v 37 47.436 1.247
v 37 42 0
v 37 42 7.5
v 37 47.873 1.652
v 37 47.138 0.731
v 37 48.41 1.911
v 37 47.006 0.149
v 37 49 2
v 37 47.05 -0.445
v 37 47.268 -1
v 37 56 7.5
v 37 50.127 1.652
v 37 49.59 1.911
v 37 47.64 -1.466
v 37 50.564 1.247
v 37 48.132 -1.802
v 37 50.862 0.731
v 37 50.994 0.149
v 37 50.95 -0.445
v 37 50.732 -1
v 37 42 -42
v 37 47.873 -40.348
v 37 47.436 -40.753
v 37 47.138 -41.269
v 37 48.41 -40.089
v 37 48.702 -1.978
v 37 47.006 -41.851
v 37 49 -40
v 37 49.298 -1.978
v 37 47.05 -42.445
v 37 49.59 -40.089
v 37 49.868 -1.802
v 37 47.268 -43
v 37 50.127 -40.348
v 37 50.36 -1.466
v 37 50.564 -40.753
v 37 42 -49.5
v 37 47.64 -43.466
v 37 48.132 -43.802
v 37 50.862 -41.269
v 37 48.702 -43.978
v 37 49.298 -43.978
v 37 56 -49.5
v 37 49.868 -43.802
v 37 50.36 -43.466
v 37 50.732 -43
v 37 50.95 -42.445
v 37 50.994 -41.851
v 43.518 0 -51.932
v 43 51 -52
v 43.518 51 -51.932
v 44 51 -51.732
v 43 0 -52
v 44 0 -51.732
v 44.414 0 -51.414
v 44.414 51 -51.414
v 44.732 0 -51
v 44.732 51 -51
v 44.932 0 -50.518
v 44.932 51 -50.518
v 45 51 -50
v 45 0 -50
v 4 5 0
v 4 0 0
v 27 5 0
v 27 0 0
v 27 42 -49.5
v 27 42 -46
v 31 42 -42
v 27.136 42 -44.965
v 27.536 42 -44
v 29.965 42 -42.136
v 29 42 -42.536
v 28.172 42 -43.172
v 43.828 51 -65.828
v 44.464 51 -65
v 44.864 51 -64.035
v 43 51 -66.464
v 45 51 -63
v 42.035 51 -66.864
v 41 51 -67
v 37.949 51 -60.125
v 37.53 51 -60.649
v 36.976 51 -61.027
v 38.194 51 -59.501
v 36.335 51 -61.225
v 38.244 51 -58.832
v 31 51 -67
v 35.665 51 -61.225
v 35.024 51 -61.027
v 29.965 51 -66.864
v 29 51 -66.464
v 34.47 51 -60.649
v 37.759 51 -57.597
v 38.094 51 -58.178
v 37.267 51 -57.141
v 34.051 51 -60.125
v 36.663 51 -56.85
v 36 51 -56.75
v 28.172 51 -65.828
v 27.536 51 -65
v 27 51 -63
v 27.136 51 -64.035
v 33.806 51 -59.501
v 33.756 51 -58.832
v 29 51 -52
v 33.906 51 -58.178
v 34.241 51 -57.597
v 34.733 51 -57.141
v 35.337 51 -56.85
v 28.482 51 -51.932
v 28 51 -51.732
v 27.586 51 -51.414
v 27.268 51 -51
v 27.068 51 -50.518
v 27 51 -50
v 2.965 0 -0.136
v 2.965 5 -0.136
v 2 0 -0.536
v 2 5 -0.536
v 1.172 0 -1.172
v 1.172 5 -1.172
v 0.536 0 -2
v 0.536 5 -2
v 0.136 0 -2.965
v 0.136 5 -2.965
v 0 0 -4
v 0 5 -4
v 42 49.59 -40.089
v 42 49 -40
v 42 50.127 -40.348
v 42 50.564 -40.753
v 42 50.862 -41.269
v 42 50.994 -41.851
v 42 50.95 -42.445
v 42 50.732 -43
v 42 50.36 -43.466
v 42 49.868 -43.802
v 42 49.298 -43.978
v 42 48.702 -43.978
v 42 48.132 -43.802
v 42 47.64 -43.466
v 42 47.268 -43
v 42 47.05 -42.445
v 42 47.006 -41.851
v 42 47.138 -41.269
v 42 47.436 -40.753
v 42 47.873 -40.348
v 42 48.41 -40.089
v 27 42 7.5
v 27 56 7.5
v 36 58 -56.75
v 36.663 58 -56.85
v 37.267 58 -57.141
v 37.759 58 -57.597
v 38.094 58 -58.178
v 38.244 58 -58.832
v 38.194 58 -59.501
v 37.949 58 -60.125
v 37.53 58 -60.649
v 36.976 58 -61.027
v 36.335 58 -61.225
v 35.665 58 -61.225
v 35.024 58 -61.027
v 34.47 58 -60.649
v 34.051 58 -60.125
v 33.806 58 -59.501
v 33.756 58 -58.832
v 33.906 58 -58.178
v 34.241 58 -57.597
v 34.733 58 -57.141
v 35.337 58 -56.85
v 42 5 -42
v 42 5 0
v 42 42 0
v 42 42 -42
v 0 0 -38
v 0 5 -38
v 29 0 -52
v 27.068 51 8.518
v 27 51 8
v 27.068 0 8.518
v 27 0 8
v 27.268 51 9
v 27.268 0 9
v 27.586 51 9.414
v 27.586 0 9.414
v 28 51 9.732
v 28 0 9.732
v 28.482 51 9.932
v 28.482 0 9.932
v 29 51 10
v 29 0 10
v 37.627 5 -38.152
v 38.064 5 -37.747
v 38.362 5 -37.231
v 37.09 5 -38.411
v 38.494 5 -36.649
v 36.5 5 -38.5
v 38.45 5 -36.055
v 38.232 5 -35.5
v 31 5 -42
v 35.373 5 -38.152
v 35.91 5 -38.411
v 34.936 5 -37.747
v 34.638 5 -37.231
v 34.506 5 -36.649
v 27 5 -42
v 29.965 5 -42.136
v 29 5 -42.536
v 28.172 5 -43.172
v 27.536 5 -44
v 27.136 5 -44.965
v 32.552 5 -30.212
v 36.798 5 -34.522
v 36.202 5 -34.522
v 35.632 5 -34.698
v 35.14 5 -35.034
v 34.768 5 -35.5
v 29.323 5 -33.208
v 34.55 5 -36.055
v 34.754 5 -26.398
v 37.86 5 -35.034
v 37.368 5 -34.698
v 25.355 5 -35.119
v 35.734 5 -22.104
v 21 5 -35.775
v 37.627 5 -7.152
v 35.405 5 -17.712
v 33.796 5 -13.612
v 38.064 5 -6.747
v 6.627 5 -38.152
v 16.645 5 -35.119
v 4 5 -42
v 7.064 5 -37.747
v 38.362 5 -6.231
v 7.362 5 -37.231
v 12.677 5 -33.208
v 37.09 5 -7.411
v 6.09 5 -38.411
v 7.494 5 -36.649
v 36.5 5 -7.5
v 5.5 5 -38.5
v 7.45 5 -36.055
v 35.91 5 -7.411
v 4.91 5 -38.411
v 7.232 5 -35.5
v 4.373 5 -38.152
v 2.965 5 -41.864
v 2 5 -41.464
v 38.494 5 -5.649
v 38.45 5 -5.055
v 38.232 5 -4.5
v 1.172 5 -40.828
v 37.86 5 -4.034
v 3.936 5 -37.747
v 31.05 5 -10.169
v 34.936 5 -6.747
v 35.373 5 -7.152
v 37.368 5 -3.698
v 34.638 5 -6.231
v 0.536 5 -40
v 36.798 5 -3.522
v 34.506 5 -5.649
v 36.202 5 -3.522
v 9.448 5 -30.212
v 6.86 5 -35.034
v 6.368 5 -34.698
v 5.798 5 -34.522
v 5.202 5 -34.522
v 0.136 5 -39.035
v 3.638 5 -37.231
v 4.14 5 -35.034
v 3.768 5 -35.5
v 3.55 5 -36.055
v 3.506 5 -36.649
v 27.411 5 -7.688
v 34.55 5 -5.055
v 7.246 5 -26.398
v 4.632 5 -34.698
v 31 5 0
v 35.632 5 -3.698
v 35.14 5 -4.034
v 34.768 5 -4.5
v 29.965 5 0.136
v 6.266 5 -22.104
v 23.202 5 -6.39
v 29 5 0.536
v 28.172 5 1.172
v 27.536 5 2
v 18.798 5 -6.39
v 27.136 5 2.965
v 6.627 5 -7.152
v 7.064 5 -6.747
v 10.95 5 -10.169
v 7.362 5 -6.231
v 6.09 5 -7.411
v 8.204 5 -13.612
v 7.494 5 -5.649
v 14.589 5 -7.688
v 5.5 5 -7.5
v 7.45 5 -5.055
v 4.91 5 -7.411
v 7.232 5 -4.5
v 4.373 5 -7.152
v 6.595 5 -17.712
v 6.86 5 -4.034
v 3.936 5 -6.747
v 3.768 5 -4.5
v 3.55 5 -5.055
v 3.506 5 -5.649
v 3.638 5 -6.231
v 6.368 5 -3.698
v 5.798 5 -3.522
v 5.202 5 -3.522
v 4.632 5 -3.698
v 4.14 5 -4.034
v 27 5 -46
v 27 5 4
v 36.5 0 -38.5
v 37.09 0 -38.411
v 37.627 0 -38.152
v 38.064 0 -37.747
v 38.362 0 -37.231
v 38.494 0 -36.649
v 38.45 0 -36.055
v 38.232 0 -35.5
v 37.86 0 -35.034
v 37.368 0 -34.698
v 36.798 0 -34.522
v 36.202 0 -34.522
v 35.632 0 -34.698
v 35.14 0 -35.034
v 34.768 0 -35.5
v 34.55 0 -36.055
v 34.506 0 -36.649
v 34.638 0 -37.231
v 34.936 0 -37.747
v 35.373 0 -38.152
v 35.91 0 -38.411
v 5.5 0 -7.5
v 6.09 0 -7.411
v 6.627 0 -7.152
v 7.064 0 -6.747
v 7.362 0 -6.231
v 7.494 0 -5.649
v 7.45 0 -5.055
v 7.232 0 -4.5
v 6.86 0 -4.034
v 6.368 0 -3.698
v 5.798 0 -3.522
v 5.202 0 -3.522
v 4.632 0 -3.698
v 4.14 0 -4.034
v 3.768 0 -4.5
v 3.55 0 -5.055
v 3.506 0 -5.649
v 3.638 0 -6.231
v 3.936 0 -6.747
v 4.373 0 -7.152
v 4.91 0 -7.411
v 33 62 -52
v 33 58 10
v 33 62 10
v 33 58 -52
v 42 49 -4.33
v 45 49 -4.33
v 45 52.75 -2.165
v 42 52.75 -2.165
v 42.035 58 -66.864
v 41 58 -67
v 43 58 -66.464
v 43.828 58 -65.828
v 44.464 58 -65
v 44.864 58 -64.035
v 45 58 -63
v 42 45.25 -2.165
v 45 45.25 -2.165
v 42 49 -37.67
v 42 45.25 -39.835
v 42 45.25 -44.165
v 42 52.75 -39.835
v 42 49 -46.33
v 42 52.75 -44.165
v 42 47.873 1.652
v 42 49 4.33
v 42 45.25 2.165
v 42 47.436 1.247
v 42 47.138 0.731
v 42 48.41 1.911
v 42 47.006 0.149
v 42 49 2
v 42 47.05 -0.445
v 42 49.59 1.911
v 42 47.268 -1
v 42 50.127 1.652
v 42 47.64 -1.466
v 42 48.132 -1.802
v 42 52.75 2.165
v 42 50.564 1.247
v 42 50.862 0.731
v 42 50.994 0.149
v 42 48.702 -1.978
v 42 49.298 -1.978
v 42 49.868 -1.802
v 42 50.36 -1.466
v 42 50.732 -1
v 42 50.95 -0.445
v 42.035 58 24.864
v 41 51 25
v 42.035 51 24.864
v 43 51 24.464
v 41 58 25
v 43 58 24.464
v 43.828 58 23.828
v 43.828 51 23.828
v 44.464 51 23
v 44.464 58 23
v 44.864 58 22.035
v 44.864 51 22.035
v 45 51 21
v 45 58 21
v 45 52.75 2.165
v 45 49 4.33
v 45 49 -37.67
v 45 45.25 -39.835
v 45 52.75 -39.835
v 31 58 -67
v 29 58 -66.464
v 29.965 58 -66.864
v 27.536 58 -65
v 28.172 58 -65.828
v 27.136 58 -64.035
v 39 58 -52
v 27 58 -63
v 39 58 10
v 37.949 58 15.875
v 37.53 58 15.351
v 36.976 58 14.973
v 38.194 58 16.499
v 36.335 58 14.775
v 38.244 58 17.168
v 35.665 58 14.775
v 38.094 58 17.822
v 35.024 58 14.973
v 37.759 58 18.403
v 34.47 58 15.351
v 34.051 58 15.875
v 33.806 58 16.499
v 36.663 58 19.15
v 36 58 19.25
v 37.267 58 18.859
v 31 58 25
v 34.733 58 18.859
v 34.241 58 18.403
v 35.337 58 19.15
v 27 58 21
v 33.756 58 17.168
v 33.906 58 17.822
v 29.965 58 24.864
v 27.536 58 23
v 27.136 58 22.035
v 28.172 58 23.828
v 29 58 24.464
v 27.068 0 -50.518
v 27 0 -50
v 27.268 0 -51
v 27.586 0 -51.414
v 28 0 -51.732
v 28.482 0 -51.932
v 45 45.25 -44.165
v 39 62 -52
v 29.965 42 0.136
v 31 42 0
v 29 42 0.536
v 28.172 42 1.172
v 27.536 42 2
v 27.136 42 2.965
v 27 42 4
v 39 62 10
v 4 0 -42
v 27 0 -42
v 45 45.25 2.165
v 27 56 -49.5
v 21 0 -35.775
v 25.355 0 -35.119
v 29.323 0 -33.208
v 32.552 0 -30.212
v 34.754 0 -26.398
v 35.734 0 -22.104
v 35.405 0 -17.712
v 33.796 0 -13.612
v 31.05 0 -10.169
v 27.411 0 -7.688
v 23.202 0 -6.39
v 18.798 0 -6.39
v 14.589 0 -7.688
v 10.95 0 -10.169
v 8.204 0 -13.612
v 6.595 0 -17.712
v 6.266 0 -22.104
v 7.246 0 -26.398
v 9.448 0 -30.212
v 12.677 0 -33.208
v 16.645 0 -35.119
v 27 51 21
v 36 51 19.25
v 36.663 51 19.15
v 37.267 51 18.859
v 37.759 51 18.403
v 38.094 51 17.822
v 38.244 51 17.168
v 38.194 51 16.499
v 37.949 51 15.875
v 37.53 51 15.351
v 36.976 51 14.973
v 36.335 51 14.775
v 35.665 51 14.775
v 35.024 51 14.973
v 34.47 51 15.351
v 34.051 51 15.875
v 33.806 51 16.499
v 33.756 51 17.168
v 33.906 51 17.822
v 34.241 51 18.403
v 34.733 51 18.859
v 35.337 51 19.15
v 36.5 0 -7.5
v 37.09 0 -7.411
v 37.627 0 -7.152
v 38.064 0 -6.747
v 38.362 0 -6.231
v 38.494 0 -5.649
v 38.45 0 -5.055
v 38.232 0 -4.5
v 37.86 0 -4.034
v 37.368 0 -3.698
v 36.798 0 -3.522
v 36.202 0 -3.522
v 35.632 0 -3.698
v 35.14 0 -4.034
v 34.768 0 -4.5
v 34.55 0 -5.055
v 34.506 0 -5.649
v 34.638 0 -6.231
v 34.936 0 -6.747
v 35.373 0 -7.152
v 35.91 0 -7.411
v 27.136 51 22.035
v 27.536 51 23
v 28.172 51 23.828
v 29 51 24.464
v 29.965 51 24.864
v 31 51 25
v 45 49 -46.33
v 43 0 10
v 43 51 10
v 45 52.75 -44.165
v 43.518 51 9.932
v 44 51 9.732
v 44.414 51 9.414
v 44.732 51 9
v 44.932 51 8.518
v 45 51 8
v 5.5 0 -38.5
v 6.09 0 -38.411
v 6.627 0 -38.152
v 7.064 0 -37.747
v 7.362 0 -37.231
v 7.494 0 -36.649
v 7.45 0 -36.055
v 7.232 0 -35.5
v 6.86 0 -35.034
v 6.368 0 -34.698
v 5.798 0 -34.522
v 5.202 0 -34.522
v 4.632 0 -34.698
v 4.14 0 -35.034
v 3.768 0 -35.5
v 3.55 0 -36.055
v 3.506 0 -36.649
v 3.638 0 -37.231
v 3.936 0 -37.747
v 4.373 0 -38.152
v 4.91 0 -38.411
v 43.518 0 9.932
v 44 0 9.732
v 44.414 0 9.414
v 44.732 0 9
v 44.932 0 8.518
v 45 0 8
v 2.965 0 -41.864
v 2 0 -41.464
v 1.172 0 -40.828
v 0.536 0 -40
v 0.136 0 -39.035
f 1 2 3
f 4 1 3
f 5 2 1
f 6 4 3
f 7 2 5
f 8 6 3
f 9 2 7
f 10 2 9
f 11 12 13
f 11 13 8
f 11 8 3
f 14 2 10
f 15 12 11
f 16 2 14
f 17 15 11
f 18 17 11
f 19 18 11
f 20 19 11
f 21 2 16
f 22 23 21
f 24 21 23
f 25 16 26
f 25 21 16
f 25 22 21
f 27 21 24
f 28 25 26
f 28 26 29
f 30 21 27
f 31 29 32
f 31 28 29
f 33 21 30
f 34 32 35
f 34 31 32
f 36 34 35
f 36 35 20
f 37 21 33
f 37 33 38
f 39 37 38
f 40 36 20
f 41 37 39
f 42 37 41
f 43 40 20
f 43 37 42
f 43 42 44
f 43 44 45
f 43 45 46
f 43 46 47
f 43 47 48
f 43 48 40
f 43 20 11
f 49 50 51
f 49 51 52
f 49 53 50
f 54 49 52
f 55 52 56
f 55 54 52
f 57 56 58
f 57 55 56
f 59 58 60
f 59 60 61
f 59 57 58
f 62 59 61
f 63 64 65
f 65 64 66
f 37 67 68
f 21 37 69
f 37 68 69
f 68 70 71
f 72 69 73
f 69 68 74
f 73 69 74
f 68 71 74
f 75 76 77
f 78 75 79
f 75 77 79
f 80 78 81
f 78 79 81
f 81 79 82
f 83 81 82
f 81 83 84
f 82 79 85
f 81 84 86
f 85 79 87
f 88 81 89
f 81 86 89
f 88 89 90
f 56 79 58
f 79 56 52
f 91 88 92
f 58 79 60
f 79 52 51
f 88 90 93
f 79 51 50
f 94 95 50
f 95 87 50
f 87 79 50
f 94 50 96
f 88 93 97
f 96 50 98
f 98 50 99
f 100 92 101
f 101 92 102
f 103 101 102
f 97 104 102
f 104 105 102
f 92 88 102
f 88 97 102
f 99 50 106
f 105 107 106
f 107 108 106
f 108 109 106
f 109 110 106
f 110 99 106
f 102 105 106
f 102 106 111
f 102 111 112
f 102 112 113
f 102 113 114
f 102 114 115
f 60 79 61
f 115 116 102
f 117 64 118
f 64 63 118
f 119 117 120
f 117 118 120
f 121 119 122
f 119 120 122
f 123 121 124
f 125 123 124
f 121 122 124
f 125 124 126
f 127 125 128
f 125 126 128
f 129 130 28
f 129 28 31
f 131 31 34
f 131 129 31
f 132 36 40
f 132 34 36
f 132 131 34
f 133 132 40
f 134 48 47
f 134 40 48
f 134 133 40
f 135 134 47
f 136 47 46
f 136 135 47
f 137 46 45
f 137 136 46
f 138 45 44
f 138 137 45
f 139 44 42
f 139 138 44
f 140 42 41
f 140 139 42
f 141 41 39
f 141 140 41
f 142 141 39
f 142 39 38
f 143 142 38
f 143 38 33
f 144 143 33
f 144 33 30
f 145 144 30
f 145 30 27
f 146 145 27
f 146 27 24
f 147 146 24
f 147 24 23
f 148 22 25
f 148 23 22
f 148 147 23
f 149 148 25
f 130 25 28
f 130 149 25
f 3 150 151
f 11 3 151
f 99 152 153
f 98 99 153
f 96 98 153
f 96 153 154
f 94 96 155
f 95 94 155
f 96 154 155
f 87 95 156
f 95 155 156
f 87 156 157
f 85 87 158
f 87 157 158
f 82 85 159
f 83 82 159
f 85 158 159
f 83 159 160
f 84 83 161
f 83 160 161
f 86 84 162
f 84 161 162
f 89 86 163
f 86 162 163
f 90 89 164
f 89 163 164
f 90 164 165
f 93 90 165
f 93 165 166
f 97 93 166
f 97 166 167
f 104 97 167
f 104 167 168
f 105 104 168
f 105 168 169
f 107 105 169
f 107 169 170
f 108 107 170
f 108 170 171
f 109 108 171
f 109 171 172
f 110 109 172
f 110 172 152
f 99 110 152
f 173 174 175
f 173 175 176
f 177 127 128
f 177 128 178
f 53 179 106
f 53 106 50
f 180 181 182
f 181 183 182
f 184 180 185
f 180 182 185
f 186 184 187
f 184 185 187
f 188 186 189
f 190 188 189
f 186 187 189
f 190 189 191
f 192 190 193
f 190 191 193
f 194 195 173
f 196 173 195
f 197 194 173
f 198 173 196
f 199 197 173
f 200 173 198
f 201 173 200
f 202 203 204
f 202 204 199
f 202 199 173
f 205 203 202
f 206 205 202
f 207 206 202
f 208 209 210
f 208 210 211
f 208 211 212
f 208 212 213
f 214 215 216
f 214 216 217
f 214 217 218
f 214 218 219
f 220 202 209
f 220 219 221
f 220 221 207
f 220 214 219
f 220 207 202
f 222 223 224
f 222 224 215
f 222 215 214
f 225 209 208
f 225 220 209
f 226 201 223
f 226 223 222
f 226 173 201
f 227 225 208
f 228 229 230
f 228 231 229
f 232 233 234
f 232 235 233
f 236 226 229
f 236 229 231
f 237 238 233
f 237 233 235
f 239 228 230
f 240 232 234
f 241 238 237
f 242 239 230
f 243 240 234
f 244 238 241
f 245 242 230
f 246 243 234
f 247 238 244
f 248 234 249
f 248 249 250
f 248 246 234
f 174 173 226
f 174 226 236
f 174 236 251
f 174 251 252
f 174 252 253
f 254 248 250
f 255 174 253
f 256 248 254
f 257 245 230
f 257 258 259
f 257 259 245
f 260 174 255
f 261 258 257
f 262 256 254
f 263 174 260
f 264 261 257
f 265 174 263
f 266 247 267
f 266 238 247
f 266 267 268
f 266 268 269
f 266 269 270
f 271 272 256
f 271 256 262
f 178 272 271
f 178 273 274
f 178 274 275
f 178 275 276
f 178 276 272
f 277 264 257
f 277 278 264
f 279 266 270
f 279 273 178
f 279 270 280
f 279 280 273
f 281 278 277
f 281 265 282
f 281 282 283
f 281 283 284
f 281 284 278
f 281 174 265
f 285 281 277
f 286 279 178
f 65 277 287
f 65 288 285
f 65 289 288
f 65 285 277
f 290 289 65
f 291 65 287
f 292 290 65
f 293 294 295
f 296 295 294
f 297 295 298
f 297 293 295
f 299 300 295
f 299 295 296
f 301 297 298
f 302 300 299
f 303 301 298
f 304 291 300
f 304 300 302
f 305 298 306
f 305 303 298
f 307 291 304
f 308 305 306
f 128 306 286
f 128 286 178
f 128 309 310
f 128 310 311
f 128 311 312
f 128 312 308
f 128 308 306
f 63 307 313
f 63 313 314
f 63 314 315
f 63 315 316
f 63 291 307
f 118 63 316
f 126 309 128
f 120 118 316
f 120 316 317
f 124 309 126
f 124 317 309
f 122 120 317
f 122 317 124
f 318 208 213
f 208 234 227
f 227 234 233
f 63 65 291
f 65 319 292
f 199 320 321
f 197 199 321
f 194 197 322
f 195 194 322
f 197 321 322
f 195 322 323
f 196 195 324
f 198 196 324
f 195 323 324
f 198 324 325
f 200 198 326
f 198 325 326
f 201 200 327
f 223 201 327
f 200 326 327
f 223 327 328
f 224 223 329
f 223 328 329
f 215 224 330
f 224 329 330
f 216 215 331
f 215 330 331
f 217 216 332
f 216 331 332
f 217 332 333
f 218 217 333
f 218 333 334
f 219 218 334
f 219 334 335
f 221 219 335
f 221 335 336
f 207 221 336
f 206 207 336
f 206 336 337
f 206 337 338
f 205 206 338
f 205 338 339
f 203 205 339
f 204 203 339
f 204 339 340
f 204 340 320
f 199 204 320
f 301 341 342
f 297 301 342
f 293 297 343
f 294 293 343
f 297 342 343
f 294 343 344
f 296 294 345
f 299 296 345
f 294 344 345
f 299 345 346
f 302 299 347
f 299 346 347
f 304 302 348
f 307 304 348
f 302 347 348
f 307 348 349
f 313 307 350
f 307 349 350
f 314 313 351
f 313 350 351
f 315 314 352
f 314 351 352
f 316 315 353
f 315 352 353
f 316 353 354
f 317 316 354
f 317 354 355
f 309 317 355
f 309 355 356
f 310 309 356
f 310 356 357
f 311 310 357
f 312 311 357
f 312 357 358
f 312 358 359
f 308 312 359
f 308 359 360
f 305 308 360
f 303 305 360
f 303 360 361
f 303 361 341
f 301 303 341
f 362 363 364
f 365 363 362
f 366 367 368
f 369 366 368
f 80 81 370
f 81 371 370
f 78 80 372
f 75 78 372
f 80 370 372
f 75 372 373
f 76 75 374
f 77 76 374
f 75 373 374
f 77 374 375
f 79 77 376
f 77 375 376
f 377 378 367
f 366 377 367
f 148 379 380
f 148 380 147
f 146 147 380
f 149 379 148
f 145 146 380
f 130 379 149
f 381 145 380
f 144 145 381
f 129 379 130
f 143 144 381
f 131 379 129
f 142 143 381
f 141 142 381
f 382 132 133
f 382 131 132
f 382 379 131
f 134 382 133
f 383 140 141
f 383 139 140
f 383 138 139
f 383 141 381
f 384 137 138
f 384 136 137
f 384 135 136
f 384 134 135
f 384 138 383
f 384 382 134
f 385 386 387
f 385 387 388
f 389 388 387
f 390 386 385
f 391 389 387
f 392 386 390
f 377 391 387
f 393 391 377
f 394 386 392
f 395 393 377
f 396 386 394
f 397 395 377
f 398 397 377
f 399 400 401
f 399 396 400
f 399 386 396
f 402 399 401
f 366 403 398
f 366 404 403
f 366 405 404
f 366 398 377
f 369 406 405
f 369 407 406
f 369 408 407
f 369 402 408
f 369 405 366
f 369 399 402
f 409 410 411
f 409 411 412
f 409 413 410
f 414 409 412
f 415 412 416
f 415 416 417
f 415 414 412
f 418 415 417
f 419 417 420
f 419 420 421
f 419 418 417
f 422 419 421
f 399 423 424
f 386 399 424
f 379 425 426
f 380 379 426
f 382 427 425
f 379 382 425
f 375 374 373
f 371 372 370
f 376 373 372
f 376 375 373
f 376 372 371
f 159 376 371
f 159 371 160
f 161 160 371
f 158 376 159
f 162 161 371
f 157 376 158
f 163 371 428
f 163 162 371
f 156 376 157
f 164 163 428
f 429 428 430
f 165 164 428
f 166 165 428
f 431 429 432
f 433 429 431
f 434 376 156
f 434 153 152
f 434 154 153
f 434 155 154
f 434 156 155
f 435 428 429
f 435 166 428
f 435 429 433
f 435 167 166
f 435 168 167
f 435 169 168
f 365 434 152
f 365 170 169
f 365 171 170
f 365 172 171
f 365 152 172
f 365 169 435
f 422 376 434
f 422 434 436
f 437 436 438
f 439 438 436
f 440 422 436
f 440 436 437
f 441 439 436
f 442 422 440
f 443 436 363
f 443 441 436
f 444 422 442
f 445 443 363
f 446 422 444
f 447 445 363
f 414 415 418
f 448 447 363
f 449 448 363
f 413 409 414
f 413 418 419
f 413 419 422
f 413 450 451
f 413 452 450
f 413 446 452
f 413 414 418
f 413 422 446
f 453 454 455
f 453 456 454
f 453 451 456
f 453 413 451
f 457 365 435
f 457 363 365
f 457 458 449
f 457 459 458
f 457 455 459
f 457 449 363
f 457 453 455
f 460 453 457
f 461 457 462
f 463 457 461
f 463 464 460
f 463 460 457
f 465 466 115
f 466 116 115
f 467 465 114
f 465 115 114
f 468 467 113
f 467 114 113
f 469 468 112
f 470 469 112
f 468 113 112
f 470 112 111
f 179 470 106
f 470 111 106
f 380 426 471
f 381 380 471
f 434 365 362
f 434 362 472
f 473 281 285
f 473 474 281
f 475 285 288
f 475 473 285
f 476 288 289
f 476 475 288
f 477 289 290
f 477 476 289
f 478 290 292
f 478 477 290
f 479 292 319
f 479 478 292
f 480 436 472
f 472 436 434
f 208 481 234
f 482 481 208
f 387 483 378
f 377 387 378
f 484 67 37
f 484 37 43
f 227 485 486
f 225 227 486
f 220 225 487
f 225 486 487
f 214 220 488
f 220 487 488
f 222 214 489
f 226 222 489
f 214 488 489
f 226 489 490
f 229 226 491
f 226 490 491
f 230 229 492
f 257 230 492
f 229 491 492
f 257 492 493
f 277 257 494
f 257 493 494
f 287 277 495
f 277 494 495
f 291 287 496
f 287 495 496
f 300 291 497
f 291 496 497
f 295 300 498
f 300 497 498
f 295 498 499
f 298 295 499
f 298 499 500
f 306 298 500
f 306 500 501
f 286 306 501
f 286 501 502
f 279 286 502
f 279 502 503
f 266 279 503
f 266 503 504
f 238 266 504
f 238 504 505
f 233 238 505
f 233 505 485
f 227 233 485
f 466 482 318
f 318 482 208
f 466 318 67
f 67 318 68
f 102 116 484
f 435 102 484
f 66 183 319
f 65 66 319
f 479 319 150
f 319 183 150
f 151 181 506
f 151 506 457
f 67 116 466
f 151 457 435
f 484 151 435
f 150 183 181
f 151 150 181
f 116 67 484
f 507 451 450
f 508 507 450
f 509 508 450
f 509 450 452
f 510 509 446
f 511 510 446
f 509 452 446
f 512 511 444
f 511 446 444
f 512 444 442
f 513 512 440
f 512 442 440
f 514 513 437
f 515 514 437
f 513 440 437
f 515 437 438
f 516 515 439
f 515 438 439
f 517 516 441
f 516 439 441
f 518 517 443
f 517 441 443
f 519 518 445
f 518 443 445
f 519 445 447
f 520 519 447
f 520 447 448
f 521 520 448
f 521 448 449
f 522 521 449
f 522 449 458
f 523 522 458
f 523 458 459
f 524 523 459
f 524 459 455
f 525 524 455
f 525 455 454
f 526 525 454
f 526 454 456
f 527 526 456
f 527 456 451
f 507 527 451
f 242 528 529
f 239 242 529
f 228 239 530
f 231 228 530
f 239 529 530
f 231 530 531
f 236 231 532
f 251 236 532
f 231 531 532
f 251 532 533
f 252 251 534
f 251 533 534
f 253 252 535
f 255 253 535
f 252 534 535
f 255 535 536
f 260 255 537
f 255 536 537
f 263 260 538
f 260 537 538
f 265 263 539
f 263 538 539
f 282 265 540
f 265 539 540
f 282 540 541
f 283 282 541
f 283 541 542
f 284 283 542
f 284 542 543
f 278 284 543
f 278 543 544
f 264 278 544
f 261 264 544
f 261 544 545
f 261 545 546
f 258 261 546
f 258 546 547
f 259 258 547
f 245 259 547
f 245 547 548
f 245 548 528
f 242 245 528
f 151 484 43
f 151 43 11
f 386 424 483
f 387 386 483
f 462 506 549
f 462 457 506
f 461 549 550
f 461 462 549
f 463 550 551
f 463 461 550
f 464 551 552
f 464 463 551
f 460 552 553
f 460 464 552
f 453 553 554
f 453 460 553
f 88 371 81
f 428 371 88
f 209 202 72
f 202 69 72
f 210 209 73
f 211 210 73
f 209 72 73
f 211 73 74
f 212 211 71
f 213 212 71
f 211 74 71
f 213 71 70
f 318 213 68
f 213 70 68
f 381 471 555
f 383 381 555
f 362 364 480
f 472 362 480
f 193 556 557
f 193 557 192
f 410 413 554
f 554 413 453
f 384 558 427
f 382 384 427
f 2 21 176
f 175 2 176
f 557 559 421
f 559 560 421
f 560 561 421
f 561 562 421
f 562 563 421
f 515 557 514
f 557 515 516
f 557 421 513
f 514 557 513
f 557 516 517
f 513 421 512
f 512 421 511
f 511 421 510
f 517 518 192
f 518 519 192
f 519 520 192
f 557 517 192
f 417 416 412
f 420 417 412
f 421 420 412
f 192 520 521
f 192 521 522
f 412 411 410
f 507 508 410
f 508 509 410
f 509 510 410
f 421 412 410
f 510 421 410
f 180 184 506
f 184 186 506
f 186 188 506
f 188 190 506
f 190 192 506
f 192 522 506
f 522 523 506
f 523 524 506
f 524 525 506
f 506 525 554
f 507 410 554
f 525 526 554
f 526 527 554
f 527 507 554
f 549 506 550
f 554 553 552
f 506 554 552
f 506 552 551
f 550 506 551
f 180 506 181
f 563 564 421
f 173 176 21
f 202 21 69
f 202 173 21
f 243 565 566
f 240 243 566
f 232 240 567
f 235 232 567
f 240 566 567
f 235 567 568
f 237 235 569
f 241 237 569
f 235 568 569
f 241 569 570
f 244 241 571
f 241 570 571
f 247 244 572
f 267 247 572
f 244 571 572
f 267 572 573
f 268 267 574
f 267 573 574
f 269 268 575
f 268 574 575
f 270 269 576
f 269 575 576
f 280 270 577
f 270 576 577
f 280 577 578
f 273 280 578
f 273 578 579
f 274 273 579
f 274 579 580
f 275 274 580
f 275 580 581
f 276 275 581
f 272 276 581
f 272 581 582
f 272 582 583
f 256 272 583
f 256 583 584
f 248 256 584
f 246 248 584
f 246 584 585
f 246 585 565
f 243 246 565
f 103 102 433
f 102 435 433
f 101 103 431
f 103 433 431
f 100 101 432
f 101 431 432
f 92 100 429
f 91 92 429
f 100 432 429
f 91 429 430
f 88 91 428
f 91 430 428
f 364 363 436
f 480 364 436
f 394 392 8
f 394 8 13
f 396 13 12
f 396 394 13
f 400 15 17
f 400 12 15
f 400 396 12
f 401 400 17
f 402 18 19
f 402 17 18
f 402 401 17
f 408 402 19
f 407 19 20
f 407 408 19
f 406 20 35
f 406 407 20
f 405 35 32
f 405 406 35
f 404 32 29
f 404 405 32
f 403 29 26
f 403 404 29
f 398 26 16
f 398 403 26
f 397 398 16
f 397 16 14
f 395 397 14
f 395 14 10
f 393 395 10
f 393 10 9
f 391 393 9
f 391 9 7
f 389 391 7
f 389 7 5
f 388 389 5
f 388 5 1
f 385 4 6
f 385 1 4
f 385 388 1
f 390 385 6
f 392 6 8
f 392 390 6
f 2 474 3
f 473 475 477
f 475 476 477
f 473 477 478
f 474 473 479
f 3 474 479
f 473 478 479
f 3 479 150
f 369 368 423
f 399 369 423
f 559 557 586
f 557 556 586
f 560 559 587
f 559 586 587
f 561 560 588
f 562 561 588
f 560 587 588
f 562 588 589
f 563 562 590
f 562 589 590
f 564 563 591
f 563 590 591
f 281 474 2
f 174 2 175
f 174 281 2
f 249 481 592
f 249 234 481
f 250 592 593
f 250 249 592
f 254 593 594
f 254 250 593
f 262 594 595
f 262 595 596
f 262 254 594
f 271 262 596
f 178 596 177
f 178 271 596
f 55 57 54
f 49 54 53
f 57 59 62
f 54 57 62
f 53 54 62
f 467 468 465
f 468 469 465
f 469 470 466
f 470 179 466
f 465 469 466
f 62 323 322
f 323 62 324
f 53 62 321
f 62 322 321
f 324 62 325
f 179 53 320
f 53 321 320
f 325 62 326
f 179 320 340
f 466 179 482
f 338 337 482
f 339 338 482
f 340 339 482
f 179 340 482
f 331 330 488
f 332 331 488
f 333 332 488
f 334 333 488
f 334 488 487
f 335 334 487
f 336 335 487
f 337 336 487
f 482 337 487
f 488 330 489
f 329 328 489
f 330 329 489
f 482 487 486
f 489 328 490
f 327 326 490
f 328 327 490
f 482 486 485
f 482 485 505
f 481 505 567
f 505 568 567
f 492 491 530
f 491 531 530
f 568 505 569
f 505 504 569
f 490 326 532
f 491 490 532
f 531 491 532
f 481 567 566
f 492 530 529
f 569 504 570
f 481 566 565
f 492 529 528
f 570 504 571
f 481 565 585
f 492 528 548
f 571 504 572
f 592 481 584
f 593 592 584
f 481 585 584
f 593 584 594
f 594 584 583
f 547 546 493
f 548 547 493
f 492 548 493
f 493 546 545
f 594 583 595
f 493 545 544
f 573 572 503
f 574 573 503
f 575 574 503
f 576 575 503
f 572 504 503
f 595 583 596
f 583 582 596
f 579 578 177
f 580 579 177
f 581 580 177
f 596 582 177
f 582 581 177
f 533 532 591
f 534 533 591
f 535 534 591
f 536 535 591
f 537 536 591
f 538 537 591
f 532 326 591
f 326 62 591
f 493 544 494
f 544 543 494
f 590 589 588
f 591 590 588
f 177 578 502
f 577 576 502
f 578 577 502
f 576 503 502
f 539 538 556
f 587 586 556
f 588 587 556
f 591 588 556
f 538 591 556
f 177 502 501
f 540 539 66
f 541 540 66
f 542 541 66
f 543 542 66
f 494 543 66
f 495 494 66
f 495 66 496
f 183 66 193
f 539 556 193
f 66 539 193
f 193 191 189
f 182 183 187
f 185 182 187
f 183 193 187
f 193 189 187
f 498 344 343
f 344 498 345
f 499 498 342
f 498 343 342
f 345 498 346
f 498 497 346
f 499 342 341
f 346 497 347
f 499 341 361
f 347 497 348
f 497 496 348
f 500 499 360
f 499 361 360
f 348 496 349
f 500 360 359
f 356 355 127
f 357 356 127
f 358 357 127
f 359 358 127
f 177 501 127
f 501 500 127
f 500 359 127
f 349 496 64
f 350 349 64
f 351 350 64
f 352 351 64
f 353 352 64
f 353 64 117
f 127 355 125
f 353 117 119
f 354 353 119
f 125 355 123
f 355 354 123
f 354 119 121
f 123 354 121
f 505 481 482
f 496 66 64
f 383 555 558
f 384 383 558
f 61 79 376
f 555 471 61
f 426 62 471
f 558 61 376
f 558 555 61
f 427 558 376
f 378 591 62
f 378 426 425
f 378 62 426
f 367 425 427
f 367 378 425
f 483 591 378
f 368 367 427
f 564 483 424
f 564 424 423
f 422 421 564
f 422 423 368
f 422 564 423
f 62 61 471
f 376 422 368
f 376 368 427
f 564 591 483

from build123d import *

# Parameters (mm, degrees)
SKETCH_1_W           = 45
SKETCH_1_H           = 42
EXTRUDE_1_DEPTH      = 5
SKETCH_3_R           = 14.775
SKETCH_3_R_2         = 2
CUT_EXTRUDE_1_DEPTH  = 13
SKETCH_7_W           = 18
SKETCH_7_H           = 5
EXTRUDE_3_DEPTH      = 10
SKETCH_8_W           = 18
SKETCH_8_H           = 5
EXTRUDE_4_DEPTH      = 10
EXTRUDE_5_DEPTH      = 53
EXTRUDE_6_DEPTH      = 15
EXTRUDE_6_DEPTH_BACK = 77
SKETCH_11_W          = 18
SKETCH_11_H          = 7
SKETCH_12_W          = 57
SKETCH_12_H          = 14
CUT_EXTRUDE_2_DEPTH  = 10
SKETCH_15_R          = 2.25
CUT_EXTRUDE_5_DEPTH  = 10
SKETCH_16_W          = 6
SKETCH_16_H          = 62
EXTRUDE_7_DEPTH      = 4
SKETCH_17_W          = 5
SKETCH_17_H          = 9.7027375
EXTRUDE_8_DEPTH      = 42
SKETCH_13_R          = 2
CUT_EXTRUDE_3_DEPTH  = 16
CUT_EXTRUDE_4_DEPTH  = 3
FILLET_1_R           = 4
FILLET_2_R           = 2


with BuildPart() as part:
    # Эскиз1 → Бобышка-Вытянуть1 (new body)
    with BuildSketch(Plane(origin=(0, 0, 0), x_dir=(1, 0, 0), z_dir=(0, 1, 0))):
        with Locations((22.5, 21)):
            Rectangle(SKETCH_1_W, SKETCH_1_H)
    extrude(amount=EXTRUDE_1_DEPTH)

    # Эскиз3 → Вырез-Вытянуть1 (cut)
    with BuildSketch(Plane.XZ):
        with Locations(Location((21, -21, 0), (0, 0, 270))):
            Circle(SKETCH_3_R)
        with Locations(Location((36.5, -5.5, 0), (0, 0, 270))):
            Circle(SKETCH_3_R_2)
        with Locations(Location((5.5, -5.5, 0), (0, 0, 270))):
            Circle(SKETCH_3_R_2)
        with Locations(Location((5.5, -36.5, 0), (0, 0, 270))):
            Circle(SKETCH_3_R_2)
        with Locations(Location((36.5, -36.5, 0), (0, 0, 270))):
            Circle(SKETCH_3_R_2)
    extrude(amount=-CUT_EXTRUDE_1_DEPTH, mode=Mode.SUBTRACT)

    # Эскиз7 → Бобышка-Вытянуть3 (add)
    with BuildSketch(Plane.XY):
        with Locations((36, 2.5)):
            Rectangle(SKETCH_7_W, SKETCH_7_H)
    extrude(amount=EXTRUDE_3_DEPTH)

    # Эскиз8 → Бобышка-Вытянуть4 (add)
    with BuildSketch(Plane(origin=(0, 0, -42), x_dir=(-1, 0, 0), z_dir=(0, 0, -1))):
        with Locations((-36, 2.5)):
            Rectangle(SKETCH_8_W, SKETCH_8_H)
    extrude(amount=EXTRUDE_4_DEPTH)

    # Эскиз10 → Бобышка-Вытянуть5 (add)
    with BuildSketch(Plane(origin=(0, 5, 0), x_dir=(1, 0, 0), z_dir=(0, 1, 0))):
        Polygon((27, 52), (45, 52), (45, -10), (27, -10), (27, 0), (42, 0), (42, 42), (27, 42), align=None)
    extrude(amount=EXTRUDE_5_DEPTH)

    # Эскиз11 → Бобышка-Вытянуть6 (add, two sides: drawn at the far end of the back side and taken through both)
    with BuildSketch(Plane(origin=(0, 0, -52), x_dir=(-1, 0, 0), z_dir=(0, 0, -1)).offset(-EXTRUDE_6_DEPTH_BACK)):
        with Locations((-36, 54.5)):
            Rectangle(SKETCH_11_W, SKETCH_11_H)
    extrude(amount=EXTRUDE_6_DEPTH + EXTRUDE_6_DEPTH_BACK)

    # Эскиз12 → Вырез-Вытянуть2 (cut)
    with BuildSketch(Plane.ZY.offset(-27)):
        with Locations((-21, 49)):
            Rectangle(SKETCH_12_W, SKETCH_12_H)
    extrude(amount=-CUT_EXTRUDE_2_DEPTH, mode=Mode.SUBTRACT)

    # Эскиз15 → Вырез-Вытянуть5 (cut)
    with BuildSketch(Plane(origin=(0, 58, 0), x_dir=(1, 0, 0), z_dir=(0, 1, 0))):
        with Locations(Location((36, -17, 0), (0, 0, 270))):
            Circle(SKETCH_15_R)
        with Locations(Location((36, 59, 0), (0, 0, 270))):
            Circle(SKETCH_15_R)
    extrude(amount=-CUT_EXTRUDE_5_DEPTH, mode=Mode.SUBTRACT)

    # Эскиз16 → Бобышка-Вытянуть7 (add)
    with BuildSketch(Plane(origin=(0, 58, 0), x_dir=(1, 0, 0), z_dir=(0, 1, 0))):
        with Locations((36, 21)):
            Rectangle(SKETCH_16_W, SKETCH_16_H)
    extrude(amount=EXTRUDE_7_DEPTH)

    # Эскиз17 → Бобышка-Вытянуть8 (add)
    with BuildSketch(Plane.XY.offset(-42)):
        with Locations((39.5, 46.85136875)):
            Rectangle(SKETCH_17_W, SKETCH_17_H)
    extrude(amount=EXTRUDE_8_DEPTH)

    # Эскиз13 → Вырез-Вытянуть3 (cut)
    with BuildSketch(Plane.ZY.offset(-45)):
        with Locations((-42, 49)):
            Circle(SKETCH_13_R)
        with Locations((0, 49)):
            Circle(SKETCH_13_R)
    extrude(amount=CUT_EXTRUDE_3_DEPTH, mode=Mode.SUBTRACT)

    # Эскиз14 → Вырез-Вытянуть4 (cut)
    with BuildSketch(Plane(origin=(45, 0, 0), x_dir=(0, 0, -1), z_dir=(1, 0, 0))):
        Polygon((2.165063509, 52.75), (-2.165063509, 52.75), (-4.330127019, 49), (-2.165063509, 45.25), (2.165063509, 45.25), (4.330127019, 49), align=None)
        Polygon((44.165063509, 52.75), (39.834936491, 52.75), (37.669872981, 49), (39.834936491, 45.25), (44.165063509, 45.25), (46.330127019, 49), align=None)
    extrude(amount=-CUT_EXTRUDE_4_DEPTH, mode=Mode.SUBTRACT)

    # Скругление1
    fillet_1_edges = [part.edges().sort_by_distance(p)[0] for p in [
        (27, 23.5, 0),
        (27, 23.5, -42),
        (0, 2.5, -42),
        (0, 2.5, 0),
        (45, 54.5, 25),
        (27, 54.5, 25),
        (45, 54.5, -67),
        (27, 54.5, -67),
    ]]
    fillet(fillet_1_edges, radius=FILLET_1_R)

    # Скругление2
    fillet_2_edges = [part.edges().sort_by_distance(p)[0] for p in [
        (45, 25.5, 10),
        (27, 25.5, -52),
        (45, 25.5, -52),
        (27, 25.5, 10),
    ]]
    fillet(fillet_2_edges, radius=FILLET_2_R)


solid = part.part
